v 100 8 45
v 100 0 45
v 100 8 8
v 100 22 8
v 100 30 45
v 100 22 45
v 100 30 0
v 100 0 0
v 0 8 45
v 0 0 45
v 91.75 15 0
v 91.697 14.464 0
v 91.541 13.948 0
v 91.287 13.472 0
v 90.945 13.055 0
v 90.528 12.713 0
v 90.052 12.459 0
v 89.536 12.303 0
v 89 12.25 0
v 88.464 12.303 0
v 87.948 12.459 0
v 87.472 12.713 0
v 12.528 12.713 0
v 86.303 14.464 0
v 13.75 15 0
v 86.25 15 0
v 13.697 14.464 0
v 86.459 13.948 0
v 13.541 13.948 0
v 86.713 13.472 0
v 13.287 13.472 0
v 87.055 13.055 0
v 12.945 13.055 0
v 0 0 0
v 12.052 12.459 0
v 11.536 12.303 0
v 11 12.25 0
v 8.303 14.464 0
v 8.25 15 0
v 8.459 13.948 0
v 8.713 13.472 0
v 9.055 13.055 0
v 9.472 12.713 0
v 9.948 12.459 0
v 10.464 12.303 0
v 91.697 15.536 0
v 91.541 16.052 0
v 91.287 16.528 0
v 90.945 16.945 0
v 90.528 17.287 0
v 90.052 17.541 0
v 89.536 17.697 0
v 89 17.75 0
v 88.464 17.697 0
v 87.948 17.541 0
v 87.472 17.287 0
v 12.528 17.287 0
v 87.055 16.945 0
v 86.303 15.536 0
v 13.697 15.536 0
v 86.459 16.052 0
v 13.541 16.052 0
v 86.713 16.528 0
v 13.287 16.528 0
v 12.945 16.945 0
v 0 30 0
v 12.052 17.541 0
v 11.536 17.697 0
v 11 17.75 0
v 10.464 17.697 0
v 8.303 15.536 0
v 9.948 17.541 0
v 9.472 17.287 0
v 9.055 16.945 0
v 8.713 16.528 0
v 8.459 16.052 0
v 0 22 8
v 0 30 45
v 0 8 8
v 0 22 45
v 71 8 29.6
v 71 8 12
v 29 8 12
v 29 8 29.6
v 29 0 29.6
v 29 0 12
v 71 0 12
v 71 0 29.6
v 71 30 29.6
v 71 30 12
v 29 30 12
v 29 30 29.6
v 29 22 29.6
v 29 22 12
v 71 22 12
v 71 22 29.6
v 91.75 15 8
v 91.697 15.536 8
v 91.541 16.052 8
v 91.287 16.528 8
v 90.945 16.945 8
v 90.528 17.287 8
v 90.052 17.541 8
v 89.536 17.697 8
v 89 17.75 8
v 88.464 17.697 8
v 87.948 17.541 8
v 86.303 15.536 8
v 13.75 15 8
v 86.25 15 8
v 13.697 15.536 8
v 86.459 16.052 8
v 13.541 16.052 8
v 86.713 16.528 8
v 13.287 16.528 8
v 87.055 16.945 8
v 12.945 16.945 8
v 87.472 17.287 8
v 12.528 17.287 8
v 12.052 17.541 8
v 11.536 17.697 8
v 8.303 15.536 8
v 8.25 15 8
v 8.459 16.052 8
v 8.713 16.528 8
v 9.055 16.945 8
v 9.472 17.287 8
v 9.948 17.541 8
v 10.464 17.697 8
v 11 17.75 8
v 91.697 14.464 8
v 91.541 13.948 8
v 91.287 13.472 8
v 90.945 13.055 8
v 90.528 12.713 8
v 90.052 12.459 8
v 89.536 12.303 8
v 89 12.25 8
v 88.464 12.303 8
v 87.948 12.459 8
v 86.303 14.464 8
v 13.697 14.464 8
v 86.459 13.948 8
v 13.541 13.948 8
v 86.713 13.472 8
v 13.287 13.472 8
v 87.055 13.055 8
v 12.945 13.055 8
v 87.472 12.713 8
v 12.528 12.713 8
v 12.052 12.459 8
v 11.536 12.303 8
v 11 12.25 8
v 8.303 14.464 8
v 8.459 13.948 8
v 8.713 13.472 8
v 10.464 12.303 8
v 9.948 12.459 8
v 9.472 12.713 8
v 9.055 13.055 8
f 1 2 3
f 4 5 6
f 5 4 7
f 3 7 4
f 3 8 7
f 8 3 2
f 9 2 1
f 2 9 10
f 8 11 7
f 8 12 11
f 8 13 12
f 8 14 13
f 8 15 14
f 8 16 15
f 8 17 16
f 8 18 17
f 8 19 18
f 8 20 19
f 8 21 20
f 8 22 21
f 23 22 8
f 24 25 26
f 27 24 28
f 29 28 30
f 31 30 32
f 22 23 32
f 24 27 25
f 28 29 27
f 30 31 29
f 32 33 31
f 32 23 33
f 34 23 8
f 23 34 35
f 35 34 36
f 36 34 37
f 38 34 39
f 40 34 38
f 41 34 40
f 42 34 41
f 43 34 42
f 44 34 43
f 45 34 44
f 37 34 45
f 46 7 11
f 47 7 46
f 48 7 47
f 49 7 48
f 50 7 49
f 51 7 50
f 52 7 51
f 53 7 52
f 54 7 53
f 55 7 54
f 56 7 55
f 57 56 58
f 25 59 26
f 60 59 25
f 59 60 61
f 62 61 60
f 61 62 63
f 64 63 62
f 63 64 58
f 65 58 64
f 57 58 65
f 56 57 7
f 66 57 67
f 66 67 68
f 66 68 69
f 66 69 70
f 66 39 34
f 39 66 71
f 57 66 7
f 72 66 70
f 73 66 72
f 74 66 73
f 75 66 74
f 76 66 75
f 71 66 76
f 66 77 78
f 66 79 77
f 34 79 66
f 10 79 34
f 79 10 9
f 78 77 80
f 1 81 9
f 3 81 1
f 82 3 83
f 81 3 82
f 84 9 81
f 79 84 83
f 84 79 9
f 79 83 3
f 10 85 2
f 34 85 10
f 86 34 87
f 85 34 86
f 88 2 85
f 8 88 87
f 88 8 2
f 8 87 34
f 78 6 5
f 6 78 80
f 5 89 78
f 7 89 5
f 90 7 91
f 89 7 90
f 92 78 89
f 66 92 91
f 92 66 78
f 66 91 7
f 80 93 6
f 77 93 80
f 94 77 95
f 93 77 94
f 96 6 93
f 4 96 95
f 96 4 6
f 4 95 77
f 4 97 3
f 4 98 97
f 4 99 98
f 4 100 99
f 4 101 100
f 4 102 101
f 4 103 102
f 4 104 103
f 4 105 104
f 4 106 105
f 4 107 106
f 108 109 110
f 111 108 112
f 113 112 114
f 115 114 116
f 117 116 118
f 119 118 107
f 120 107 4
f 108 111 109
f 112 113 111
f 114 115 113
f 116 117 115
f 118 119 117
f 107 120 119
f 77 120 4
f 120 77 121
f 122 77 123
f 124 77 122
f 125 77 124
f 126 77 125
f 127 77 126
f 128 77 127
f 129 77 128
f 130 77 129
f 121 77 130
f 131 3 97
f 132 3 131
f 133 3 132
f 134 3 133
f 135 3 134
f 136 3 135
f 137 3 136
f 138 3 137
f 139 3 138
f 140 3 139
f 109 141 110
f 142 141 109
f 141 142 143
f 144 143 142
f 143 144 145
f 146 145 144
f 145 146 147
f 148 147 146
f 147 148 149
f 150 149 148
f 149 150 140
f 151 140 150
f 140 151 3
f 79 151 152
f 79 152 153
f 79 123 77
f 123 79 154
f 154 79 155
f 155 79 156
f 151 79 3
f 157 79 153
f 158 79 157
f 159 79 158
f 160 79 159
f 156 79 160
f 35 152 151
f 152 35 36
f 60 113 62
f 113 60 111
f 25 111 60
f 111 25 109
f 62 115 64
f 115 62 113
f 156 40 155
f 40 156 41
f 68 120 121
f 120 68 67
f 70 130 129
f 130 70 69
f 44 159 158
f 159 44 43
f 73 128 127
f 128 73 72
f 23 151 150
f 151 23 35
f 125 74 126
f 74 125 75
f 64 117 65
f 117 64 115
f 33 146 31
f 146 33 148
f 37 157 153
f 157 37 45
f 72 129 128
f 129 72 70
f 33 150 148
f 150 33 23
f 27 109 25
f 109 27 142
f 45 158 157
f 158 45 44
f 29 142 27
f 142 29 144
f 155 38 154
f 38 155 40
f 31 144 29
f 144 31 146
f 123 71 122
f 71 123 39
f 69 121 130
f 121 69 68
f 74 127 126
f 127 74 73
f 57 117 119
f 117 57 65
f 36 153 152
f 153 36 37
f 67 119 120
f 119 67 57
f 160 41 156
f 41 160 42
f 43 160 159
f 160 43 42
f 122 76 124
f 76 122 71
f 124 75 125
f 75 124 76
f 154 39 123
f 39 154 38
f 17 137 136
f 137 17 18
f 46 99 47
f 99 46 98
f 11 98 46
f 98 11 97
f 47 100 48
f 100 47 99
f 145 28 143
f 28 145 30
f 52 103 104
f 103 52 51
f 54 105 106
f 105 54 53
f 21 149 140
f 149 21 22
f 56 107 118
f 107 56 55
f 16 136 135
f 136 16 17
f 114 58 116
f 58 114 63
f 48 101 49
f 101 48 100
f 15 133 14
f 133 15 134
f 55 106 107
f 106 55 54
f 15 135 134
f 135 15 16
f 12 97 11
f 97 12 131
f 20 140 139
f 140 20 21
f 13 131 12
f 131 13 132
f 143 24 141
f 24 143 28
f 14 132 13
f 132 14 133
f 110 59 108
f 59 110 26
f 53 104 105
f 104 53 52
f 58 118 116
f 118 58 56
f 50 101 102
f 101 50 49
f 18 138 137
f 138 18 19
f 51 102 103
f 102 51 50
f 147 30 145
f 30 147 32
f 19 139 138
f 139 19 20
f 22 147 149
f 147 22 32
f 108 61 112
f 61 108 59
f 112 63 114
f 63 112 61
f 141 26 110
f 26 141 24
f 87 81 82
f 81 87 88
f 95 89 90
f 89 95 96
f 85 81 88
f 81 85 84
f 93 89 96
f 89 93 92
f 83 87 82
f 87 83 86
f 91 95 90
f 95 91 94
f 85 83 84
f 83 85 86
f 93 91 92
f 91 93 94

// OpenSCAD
$fn = 32;

// ----------------------------------------------------------------------
// U-bracket: 100 x 30 x 45 mm
// ----------------------------------------------------------------------

// --- parameters (mm) ---
rail_len = 100;           // outer length, X
jaw_w = 30;               // outer width, Y
jaw_h = 45;               // upright height, Z
web_t = 8;                // wall thickness
hole_d = 5.5;             // clearance for M5
window_l = 42;            // window length
window_h = 17.6;          // window height

module hole_z(px, py) {
  translate([px, py, -2.5]) cylinder(h = web_t + 5, d = hole_d);
}
module hole_y_pz(pz) {
  /* through both uprights along Y */
  translate([0, -2.5, pz]) rotate([-90, 0, 0]) cylinder(h = jaw_w + 5, d = hole_d);
}

module base() {
  cube([rail_len, jaw_w, web_t]);
}

module uprights() {
  cube([rail_len, web_t, jaw_h]);
  translate([0, jaw_w - web_t, 0]) cube([rail_len, web_t, jaw_h]);
}

difference() {
  union() {
    base();
    uprights();
  }
  hole_z(11, 15);
  hole_z(89, 15);
  /* lightening window through both uprights */
  translate([rail_len / 2 - window_l / 2, -1, web_t + 4])
    cube([window_l, jaw_w + 2, window_h]);
}
